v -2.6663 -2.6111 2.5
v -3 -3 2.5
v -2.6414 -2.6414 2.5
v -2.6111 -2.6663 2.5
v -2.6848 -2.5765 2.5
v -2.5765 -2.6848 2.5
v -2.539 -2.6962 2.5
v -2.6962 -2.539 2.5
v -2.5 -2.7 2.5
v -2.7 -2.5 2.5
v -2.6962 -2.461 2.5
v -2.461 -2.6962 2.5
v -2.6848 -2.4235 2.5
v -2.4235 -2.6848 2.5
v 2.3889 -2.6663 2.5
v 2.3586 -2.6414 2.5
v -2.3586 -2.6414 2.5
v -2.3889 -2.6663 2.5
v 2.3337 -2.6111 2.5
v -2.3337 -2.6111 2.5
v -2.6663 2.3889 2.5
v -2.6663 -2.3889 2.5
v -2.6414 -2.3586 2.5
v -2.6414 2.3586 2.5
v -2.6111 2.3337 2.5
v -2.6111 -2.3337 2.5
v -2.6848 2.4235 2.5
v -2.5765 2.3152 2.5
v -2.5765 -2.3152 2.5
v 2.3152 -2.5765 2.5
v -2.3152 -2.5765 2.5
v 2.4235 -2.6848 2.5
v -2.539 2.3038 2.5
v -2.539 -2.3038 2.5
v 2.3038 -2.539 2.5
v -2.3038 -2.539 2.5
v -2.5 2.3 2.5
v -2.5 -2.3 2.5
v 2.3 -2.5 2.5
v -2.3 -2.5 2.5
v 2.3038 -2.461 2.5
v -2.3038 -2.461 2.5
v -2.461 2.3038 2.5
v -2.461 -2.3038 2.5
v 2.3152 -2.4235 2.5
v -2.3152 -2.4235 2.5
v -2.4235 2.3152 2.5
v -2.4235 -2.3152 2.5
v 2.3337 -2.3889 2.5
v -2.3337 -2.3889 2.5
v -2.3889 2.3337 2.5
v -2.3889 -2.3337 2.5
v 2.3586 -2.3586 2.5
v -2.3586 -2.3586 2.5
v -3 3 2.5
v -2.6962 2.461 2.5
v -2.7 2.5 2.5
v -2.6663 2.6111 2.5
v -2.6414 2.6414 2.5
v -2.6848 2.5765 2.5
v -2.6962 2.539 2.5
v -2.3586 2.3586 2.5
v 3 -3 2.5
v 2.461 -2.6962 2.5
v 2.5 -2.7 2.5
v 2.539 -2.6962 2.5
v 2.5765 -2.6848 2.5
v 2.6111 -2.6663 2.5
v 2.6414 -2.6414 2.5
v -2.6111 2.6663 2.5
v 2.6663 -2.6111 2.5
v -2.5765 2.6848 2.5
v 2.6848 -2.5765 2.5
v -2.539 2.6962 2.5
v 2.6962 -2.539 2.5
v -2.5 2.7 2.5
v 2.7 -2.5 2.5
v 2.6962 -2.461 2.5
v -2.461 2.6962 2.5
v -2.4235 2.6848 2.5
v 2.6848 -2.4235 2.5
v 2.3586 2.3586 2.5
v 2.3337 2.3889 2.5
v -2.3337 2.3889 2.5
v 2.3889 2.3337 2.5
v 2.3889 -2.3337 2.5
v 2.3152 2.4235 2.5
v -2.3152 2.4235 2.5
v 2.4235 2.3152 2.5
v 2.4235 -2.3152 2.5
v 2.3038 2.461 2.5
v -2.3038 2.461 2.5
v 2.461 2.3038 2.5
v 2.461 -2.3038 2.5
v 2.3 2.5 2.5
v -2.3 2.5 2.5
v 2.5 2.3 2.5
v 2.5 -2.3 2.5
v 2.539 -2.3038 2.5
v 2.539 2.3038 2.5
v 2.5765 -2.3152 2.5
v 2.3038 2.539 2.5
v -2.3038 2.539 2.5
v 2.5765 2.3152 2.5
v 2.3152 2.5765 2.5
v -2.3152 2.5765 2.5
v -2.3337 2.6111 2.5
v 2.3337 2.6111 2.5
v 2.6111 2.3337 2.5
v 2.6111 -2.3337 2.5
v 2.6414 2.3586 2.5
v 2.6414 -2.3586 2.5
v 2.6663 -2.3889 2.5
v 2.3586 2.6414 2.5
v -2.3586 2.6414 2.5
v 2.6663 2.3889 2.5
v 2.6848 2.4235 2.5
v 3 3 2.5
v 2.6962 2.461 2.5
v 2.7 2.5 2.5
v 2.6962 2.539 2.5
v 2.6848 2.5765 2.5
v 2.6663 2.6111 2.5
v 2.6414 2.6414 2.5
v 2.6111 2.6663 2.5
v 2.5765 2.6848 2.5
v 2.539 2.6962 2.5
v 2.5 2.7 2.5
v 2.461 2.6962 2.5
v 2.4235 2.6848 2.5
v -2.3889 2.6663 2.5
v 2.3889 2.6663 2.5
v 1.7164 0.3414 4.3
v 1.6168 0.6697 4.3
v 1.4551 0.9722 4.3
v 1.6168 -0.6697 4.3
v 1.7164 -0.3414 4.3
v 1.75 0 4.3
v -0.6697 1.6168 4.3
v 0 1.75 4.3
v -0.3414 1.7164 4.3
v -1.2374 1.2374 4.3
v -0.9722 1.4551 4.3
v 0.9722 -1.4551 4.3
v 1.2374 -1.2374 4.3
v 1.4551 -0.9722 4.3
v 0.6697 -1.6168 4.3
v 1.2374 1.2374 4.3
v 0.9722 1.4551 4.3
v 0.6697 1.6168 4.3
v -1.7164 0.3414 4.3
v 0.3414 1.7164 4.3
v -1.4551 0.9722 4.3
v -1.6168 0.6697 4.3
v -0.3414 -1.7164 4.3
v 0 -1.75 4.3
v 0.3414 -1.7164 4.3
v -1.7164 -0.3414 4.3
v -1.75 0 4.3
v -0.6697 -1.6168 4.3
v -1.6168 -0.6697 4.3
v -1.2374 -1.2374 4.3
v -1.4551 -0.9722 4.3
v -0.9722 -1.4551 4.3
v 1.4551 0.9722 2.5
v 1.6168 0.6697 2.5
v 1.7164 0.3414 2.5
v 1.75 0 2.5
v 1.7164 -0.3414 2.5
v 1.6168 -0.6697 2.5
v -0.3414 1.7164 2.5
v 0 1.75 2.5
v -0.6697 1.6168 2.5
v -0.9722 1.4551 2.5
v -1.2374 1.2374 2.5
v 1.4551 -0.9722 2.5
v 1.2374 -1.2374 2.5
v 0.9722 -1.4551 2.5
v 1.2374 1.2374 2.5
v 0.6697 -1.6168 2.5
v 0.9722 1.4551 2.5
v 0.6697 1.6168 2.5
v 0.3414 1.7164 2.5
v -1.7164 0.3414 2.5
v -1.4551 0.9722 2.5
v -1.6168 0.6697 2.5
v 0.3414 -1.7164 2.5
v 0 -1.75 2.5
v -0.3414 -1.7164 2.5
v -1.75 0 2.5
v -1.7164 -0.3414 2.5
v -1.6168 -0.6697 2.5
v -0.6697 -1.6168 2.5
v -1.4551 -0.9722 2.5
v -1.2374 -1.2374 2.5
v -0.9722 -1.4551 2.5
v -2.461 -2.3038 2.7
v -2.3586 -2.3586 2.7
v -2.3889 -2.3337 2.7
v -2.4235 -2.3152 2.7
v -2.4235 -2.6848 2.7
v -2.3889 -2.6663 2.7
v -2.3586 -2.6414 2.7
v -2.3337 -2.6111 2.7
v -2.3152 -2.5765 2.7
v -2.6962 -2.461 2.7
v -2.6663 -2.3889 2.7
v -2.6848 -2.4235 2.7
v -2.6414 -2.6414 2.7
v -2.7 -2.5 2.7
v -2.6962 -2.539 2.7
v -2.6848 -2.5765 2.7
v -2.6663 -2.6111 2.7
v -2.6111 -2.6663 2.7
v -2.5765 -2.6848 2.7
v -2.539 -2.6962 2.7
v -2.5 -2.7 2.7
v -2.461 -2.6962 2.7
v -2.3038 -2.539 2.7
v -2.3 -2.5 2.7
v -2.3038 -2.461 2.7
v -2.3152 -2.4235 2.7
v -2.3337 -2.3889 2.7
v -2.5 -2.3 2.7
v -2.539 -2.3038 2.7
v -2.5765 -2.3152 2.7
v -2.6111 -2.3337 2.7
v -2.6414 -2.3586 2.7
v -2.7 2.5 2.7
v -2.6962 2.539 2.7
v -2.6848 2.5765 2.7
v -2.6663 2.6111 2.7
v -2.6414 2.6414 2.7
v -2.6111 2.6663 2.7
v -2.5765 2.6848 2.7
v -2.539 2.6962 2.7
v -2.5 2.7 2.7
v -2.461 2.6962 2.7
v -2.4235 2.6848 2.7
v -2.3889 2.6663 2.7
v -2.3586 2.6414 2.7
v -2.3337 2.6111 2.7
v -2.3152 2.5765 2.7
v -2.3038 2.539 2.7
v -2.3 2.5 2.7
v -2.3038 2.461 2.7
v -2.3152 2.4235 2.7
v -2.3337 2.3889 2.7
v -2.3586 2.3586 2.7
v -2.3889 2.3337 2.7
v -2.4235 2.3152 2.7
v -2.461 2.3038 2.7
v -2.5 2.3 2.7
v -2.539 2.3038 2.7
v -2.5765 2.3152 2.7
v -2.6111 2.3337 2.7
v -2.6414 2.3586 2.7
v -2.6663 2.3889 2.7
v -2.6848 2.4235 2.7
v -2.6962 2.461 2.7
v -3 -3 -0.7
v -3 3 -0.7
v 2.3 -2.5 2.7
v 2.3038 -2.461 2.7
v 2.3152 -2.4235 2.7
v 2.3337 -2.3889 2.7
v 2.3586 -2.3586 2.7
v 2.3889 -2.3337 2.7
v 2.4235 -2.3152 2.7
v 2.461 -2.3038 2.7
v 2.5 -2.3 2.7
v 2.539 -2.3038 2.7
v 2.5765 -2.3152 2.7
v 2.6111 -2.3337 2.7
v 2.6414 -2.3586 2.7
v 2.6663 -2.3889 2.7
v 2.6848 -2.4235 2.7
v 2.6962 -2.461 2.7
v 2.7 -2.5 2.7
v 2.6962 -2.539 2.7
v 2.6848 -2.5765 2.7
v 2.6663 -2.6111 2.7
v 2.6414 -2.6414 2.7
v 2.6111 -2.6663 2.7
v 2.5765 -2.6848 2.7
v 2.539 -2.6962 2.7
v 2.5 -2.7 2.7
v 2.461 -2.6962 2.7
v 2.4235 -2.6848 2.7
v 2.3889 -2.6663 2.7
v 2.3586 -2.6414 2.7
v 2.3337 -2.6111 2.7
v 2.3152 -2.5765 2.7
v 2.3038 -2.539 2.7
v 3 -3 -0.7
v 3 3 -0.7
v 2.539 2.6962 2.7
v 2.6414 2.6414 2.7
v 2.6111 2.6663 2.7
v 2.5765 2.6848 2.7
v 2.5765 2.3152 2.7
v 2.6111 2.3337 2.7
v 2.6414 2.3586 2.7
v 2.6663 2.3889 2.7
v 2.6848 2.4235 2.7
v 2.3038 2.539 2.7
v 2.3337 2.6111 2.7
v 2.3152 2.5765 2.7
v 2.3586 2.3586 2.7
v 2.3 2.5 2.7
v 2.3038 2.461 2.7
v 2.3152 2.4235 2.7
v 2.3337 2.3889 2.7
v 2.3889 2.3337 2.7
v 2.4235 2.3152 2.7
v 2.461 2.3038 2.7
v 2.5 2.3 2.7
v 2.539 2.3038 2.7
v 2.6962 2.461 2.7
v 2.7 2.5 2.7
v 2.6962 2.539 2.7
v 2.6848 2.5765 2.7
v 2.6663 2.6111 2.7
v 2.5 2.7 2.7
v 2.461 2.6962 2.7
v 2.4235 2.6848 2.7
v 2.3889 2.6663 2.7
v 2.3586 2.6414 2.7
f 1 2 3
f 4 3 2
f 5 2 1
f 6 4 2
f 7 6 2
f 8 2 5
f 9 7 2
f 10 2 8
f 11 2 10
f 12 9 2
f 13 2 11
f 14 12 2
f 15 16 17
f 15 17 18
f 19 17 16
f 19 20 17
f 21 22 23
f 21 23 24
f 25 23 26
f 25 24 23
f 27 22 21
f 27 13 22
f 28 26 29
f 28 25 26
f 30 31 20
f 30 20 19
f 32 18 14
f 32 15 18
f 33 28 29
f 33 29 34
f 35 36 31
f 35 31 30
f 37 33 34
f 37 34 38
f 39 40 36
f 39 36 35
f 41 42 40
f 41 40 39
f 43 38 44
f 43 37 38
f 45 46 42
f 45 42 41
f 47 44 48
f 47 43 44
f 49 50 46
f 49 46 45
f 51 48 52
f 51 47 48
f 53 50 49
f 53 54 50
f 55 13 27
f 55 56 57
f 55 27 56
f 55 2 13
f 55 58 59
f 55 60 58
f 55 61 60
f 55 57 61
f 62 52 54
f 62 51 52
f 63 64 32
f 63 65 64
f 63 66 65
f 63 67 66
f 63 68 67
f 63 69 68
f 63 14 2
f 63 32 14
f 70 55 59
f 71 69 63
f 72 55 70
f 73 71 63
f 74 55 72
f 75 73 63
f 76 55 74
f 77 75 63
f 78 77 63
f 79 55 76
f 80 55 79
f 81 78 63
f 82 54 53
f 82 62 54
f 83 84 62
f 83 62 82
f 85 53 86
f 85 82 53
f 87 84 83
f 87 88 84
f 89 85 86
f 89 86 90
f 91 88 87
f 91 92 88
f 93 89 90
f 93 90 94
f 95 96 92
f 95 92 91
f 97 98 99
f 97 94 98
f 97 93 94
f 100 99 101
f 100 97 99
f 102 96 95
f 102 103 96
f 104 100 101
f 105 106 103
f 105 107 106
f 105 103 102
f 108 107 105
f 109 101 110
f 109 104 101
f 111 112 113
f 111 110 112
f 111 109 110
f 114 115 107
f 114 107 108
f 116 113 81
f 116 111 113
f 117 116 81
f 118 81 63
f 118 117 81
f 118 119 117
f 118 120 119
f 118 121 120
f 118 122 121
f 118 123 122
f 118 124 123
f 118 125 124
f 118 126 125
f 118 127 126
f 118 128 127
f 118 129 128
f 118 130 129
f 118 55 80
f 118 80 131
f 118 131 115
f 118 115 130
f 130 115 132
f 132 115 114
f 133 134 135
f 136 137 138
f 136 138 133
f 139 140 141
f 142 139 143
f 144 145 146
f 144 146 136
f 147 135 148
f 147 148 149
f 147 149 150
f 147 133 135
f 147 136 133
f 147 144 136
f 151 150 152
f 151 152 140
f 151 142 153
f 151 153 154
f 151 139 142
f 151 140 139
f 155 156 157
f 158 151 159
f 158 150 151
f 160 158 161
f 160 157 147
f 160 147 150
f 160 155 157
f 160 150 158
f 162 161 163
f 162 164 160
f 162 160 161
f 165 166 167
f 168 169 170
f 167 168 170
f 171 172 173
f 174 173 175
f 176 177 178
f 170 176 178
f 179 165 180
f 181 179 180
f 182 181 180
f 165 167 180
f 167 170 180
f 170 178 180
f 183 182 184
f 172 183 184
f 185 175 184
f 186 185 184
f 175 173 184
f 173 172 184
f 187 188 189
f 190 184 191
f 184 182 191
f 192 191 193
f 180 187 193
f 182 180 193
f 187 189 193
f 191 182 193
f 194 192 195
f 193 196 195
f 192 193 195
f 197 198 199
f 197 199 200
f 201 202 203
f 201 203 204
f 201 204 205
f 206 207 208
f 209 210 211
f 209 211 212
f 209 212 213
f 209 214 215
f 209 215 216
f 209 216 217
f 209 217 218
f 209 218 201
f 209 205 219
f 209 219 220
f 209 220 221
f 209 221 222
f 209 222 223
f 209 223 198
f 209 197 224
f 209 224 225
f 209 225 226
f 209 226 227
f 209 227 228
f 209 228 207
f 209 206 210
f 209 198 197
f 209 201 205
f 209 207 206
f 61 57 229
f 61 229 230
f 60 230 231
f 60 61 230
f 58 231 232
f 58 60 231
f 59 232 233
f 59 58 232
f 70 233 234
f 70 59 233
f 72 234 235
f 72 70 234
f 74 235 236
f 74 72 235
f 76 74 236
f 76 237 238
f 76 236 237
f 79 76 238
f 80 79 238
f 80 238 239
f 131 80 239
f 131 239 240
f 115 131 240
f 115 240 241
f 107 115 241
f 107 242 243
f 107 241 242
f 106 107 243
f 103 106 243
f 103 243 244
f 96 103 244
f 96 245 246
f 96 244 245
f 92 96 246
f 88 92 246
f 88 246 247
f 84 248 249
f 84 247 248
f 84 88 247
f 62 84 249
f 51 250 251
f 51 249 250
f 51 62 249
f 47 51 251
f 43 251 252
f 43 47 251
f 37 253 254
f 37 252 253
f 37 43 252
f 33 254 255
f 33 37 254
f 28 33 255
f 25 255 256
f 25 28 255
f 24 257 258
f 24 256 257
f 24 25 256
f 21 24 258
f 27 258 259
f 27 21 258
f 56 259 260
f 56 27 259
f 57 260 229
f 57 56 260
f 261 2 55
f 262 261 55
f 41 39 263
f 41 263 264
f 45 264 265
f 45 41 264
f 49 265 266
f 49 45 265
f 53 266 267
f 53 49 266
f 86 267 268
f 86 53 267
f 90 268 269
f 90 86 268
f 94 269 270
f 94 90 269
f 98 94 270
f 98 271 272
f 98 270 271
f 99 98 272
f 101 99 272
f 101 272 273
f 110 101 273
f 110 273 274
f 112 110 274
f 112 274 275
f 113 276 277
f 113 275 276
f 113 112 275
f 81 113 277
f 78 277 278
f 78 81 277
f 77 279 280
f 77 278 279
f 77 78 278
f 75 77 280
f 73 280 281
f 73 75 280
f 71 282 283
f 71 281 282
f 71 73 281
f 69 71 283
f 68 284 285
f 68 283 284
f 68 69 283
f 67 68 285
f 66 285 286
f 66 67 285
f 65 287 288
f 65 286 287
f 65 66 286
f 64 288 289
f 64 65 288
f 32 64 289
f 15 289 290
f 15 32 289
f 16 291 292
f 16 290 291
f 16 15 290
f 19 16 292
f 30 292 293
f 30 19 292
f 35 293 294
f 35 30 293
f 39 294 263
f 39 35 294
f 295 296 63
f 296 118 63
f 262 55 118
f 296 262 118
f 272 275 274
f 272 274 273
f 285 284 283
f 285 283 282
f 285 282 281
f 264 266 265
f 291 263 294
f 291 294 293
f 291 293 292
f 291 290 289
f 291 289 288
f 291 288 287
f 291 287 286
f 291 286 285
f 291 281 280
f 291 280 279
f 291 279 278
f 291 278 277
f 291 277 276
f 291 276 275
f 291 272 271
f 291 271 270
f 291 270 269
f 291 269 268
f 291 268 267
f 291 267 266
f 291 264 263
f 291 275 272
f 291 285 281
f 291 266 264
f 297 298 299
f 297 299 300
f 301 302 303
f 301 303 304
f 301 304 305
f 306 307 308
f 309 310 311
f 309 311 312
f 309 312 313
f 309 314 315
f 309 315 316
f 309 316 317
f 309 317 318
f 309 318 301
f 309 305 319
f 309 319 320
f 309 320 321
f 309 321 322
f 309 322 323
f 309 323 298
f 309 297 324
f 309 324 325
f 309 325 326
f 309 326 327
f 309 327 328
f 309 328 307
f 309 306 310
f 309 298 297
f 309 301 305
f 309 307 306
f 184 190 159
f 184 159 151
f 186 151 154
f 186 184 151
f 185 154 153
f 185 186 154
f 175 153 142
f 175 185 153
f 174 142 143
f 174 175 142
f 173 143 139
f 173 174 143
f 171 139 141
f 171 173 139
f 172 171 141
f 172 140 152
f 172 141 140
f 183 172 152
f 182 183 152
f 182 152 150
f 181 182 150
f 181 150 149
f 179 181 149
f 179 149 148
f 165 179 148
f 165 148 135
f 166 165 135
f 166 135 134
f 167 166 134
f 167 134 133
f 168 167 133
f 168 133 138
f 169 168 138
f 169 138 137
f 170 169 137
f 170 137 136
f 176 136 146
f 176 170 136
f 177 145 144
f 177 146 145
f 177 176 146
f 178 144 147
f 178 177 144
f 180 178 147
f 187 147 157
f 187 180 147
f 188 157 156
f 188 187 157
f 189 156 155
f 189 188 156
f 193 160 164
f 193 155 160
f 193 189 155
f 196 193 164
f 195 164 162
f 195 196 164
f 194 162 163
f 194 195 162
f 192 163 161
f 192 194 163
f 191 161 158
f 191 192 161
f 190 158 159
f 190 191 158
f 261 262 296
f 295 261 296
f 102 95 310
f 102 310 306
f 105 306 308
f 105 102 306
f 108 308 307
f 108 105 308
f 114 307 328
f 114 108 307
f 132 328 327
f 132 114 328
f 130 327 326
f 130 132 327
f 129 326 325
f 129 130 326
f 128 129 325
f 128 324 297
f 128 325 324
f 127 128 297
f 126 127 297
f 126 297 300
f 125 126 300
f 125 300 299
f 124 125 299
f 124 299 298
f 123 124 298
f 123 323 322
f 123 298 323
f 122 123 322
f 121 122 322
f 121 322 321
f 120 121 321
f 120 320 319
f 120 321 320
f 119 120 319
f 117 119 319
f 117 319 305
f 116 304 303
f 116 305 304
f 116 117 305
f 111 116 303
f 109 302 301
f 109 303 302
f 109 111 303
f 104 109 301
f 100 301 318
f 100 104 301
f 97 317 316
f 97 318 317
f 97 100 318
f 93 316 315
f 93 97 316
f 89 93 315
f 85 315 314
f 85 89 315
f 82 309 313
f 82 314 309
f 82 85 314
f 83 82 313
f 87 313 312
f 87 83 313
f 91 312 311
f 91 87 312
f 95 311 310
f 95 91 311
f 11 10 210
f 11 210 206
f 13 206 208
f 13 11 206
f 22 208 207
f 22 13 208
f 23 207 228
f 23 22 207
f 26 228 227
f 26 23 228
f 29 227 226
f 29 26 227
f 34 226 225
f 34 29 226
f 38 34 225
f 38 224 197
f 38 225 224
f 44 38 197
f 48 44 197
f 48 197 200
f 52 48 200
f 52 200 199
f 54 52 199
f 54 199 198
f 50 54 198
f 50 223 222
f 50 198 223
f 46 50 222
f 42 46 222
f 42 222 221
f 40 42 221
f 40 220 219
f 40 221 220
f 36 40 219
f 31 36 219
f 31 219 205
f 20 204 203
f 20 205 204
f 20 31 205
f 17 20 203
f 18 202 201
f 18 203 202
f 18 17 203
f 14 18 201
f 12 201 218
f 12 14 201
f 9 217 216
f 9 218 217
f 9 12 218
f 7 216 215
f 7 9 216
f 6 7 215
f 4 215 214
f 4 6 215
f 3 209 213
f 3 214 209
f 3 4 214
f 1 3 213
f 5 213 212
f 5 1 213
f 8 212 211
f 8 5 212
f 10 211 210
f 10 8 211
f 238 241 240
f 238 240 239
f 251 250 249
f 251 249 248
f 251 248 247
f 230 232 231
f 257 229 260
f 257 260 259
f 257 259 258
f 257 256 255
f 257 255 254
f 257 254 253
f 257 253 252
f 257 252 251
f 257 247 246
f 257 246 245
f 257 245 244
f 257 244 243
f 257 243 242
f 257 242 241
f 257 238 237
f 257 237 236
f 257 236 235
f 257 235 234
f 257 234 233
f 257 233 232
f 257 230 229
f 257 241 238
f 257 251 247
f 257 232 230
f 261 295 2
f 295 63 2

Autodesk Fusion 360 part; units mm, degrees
sketch "Sketch1" plane through (0, 0, 0) normal (0, 0, 1) x (1, 0, 0)
  line L0 (-3, 3) -> (3, 3)
  line L1 (3, 3) -> (3, -3)
  line L2 (3, -3) -> (-3, -3)
  line L3 (-3, -3) -> (-3, 3)
  dimension "d1" = 6
  dimension "d2" = 6
  dimension "d3" = 3
  dimension "d4" = 3
extrude "Extrude1" add sketch "Sketch1" along normal blind 2.5 makes body 1
sketch "Sketch2" plane through (0, 0, 2.5) normal (0, 0, 1) x (-1, 0, 0)
  line L0 (3, 3) -> (-3, 3)
  line L1 (-3, 3) -> (-3, -3)
  line L2 (-3, -3) -> (3, -3)
  line L3 (3, -3) -> (3, 3)
  circle A0 centre (0, 0) radius 1.75
  circle A1 centre (2.5, -2.5) radius 0.2
  circle A2 centre (2.5, 2.5) radius 0.2
  circle A3 centre (-2.5, 2.5) radius 0.2
  circle A4 centre (-2.5, -2.5) radius 0.2
  dimension "d7" = 3.5
  dimension "d8" = 0.4
  dimension "d9" = 0.4
  dimension "d10" = 0.4
  dimension "d11" = 0.4
extrude "Extrude2" add sketch "Sketch2" along normal blind 0.4 contours A1 | A2 | A3 | A4 bodies 1
extrude "Extrude3" add sketch "Sketch2" along normal blind 1.8 contours A0 bodies 1
extrude "Extrude4" add 1 faces at (-1, -1, 0) along direction (0, 0, -1) blind 0.7 on bodies 1 bodies 1
extrude "Extrude5" cut 4 faces at (2.5659, -2.6006, 2.9) (2.5659, 2.3994, 2.9) (-2.4341, 2.3994, 2.9) (-2.4341, -2.6006, 2.9) along direction (0, 0, -1) blind 0.2 on bodies 1 bodies 1
delete_face "DeleteFace1" 2 faces at (0.482, -0.4649, 4.3) (-1.7478, 0.0872, 3.7) on bodies 1
extrude "Extrude6" add sketch "Sketch2" along normal blind 1.8 separate body contours A0 makes body 2
